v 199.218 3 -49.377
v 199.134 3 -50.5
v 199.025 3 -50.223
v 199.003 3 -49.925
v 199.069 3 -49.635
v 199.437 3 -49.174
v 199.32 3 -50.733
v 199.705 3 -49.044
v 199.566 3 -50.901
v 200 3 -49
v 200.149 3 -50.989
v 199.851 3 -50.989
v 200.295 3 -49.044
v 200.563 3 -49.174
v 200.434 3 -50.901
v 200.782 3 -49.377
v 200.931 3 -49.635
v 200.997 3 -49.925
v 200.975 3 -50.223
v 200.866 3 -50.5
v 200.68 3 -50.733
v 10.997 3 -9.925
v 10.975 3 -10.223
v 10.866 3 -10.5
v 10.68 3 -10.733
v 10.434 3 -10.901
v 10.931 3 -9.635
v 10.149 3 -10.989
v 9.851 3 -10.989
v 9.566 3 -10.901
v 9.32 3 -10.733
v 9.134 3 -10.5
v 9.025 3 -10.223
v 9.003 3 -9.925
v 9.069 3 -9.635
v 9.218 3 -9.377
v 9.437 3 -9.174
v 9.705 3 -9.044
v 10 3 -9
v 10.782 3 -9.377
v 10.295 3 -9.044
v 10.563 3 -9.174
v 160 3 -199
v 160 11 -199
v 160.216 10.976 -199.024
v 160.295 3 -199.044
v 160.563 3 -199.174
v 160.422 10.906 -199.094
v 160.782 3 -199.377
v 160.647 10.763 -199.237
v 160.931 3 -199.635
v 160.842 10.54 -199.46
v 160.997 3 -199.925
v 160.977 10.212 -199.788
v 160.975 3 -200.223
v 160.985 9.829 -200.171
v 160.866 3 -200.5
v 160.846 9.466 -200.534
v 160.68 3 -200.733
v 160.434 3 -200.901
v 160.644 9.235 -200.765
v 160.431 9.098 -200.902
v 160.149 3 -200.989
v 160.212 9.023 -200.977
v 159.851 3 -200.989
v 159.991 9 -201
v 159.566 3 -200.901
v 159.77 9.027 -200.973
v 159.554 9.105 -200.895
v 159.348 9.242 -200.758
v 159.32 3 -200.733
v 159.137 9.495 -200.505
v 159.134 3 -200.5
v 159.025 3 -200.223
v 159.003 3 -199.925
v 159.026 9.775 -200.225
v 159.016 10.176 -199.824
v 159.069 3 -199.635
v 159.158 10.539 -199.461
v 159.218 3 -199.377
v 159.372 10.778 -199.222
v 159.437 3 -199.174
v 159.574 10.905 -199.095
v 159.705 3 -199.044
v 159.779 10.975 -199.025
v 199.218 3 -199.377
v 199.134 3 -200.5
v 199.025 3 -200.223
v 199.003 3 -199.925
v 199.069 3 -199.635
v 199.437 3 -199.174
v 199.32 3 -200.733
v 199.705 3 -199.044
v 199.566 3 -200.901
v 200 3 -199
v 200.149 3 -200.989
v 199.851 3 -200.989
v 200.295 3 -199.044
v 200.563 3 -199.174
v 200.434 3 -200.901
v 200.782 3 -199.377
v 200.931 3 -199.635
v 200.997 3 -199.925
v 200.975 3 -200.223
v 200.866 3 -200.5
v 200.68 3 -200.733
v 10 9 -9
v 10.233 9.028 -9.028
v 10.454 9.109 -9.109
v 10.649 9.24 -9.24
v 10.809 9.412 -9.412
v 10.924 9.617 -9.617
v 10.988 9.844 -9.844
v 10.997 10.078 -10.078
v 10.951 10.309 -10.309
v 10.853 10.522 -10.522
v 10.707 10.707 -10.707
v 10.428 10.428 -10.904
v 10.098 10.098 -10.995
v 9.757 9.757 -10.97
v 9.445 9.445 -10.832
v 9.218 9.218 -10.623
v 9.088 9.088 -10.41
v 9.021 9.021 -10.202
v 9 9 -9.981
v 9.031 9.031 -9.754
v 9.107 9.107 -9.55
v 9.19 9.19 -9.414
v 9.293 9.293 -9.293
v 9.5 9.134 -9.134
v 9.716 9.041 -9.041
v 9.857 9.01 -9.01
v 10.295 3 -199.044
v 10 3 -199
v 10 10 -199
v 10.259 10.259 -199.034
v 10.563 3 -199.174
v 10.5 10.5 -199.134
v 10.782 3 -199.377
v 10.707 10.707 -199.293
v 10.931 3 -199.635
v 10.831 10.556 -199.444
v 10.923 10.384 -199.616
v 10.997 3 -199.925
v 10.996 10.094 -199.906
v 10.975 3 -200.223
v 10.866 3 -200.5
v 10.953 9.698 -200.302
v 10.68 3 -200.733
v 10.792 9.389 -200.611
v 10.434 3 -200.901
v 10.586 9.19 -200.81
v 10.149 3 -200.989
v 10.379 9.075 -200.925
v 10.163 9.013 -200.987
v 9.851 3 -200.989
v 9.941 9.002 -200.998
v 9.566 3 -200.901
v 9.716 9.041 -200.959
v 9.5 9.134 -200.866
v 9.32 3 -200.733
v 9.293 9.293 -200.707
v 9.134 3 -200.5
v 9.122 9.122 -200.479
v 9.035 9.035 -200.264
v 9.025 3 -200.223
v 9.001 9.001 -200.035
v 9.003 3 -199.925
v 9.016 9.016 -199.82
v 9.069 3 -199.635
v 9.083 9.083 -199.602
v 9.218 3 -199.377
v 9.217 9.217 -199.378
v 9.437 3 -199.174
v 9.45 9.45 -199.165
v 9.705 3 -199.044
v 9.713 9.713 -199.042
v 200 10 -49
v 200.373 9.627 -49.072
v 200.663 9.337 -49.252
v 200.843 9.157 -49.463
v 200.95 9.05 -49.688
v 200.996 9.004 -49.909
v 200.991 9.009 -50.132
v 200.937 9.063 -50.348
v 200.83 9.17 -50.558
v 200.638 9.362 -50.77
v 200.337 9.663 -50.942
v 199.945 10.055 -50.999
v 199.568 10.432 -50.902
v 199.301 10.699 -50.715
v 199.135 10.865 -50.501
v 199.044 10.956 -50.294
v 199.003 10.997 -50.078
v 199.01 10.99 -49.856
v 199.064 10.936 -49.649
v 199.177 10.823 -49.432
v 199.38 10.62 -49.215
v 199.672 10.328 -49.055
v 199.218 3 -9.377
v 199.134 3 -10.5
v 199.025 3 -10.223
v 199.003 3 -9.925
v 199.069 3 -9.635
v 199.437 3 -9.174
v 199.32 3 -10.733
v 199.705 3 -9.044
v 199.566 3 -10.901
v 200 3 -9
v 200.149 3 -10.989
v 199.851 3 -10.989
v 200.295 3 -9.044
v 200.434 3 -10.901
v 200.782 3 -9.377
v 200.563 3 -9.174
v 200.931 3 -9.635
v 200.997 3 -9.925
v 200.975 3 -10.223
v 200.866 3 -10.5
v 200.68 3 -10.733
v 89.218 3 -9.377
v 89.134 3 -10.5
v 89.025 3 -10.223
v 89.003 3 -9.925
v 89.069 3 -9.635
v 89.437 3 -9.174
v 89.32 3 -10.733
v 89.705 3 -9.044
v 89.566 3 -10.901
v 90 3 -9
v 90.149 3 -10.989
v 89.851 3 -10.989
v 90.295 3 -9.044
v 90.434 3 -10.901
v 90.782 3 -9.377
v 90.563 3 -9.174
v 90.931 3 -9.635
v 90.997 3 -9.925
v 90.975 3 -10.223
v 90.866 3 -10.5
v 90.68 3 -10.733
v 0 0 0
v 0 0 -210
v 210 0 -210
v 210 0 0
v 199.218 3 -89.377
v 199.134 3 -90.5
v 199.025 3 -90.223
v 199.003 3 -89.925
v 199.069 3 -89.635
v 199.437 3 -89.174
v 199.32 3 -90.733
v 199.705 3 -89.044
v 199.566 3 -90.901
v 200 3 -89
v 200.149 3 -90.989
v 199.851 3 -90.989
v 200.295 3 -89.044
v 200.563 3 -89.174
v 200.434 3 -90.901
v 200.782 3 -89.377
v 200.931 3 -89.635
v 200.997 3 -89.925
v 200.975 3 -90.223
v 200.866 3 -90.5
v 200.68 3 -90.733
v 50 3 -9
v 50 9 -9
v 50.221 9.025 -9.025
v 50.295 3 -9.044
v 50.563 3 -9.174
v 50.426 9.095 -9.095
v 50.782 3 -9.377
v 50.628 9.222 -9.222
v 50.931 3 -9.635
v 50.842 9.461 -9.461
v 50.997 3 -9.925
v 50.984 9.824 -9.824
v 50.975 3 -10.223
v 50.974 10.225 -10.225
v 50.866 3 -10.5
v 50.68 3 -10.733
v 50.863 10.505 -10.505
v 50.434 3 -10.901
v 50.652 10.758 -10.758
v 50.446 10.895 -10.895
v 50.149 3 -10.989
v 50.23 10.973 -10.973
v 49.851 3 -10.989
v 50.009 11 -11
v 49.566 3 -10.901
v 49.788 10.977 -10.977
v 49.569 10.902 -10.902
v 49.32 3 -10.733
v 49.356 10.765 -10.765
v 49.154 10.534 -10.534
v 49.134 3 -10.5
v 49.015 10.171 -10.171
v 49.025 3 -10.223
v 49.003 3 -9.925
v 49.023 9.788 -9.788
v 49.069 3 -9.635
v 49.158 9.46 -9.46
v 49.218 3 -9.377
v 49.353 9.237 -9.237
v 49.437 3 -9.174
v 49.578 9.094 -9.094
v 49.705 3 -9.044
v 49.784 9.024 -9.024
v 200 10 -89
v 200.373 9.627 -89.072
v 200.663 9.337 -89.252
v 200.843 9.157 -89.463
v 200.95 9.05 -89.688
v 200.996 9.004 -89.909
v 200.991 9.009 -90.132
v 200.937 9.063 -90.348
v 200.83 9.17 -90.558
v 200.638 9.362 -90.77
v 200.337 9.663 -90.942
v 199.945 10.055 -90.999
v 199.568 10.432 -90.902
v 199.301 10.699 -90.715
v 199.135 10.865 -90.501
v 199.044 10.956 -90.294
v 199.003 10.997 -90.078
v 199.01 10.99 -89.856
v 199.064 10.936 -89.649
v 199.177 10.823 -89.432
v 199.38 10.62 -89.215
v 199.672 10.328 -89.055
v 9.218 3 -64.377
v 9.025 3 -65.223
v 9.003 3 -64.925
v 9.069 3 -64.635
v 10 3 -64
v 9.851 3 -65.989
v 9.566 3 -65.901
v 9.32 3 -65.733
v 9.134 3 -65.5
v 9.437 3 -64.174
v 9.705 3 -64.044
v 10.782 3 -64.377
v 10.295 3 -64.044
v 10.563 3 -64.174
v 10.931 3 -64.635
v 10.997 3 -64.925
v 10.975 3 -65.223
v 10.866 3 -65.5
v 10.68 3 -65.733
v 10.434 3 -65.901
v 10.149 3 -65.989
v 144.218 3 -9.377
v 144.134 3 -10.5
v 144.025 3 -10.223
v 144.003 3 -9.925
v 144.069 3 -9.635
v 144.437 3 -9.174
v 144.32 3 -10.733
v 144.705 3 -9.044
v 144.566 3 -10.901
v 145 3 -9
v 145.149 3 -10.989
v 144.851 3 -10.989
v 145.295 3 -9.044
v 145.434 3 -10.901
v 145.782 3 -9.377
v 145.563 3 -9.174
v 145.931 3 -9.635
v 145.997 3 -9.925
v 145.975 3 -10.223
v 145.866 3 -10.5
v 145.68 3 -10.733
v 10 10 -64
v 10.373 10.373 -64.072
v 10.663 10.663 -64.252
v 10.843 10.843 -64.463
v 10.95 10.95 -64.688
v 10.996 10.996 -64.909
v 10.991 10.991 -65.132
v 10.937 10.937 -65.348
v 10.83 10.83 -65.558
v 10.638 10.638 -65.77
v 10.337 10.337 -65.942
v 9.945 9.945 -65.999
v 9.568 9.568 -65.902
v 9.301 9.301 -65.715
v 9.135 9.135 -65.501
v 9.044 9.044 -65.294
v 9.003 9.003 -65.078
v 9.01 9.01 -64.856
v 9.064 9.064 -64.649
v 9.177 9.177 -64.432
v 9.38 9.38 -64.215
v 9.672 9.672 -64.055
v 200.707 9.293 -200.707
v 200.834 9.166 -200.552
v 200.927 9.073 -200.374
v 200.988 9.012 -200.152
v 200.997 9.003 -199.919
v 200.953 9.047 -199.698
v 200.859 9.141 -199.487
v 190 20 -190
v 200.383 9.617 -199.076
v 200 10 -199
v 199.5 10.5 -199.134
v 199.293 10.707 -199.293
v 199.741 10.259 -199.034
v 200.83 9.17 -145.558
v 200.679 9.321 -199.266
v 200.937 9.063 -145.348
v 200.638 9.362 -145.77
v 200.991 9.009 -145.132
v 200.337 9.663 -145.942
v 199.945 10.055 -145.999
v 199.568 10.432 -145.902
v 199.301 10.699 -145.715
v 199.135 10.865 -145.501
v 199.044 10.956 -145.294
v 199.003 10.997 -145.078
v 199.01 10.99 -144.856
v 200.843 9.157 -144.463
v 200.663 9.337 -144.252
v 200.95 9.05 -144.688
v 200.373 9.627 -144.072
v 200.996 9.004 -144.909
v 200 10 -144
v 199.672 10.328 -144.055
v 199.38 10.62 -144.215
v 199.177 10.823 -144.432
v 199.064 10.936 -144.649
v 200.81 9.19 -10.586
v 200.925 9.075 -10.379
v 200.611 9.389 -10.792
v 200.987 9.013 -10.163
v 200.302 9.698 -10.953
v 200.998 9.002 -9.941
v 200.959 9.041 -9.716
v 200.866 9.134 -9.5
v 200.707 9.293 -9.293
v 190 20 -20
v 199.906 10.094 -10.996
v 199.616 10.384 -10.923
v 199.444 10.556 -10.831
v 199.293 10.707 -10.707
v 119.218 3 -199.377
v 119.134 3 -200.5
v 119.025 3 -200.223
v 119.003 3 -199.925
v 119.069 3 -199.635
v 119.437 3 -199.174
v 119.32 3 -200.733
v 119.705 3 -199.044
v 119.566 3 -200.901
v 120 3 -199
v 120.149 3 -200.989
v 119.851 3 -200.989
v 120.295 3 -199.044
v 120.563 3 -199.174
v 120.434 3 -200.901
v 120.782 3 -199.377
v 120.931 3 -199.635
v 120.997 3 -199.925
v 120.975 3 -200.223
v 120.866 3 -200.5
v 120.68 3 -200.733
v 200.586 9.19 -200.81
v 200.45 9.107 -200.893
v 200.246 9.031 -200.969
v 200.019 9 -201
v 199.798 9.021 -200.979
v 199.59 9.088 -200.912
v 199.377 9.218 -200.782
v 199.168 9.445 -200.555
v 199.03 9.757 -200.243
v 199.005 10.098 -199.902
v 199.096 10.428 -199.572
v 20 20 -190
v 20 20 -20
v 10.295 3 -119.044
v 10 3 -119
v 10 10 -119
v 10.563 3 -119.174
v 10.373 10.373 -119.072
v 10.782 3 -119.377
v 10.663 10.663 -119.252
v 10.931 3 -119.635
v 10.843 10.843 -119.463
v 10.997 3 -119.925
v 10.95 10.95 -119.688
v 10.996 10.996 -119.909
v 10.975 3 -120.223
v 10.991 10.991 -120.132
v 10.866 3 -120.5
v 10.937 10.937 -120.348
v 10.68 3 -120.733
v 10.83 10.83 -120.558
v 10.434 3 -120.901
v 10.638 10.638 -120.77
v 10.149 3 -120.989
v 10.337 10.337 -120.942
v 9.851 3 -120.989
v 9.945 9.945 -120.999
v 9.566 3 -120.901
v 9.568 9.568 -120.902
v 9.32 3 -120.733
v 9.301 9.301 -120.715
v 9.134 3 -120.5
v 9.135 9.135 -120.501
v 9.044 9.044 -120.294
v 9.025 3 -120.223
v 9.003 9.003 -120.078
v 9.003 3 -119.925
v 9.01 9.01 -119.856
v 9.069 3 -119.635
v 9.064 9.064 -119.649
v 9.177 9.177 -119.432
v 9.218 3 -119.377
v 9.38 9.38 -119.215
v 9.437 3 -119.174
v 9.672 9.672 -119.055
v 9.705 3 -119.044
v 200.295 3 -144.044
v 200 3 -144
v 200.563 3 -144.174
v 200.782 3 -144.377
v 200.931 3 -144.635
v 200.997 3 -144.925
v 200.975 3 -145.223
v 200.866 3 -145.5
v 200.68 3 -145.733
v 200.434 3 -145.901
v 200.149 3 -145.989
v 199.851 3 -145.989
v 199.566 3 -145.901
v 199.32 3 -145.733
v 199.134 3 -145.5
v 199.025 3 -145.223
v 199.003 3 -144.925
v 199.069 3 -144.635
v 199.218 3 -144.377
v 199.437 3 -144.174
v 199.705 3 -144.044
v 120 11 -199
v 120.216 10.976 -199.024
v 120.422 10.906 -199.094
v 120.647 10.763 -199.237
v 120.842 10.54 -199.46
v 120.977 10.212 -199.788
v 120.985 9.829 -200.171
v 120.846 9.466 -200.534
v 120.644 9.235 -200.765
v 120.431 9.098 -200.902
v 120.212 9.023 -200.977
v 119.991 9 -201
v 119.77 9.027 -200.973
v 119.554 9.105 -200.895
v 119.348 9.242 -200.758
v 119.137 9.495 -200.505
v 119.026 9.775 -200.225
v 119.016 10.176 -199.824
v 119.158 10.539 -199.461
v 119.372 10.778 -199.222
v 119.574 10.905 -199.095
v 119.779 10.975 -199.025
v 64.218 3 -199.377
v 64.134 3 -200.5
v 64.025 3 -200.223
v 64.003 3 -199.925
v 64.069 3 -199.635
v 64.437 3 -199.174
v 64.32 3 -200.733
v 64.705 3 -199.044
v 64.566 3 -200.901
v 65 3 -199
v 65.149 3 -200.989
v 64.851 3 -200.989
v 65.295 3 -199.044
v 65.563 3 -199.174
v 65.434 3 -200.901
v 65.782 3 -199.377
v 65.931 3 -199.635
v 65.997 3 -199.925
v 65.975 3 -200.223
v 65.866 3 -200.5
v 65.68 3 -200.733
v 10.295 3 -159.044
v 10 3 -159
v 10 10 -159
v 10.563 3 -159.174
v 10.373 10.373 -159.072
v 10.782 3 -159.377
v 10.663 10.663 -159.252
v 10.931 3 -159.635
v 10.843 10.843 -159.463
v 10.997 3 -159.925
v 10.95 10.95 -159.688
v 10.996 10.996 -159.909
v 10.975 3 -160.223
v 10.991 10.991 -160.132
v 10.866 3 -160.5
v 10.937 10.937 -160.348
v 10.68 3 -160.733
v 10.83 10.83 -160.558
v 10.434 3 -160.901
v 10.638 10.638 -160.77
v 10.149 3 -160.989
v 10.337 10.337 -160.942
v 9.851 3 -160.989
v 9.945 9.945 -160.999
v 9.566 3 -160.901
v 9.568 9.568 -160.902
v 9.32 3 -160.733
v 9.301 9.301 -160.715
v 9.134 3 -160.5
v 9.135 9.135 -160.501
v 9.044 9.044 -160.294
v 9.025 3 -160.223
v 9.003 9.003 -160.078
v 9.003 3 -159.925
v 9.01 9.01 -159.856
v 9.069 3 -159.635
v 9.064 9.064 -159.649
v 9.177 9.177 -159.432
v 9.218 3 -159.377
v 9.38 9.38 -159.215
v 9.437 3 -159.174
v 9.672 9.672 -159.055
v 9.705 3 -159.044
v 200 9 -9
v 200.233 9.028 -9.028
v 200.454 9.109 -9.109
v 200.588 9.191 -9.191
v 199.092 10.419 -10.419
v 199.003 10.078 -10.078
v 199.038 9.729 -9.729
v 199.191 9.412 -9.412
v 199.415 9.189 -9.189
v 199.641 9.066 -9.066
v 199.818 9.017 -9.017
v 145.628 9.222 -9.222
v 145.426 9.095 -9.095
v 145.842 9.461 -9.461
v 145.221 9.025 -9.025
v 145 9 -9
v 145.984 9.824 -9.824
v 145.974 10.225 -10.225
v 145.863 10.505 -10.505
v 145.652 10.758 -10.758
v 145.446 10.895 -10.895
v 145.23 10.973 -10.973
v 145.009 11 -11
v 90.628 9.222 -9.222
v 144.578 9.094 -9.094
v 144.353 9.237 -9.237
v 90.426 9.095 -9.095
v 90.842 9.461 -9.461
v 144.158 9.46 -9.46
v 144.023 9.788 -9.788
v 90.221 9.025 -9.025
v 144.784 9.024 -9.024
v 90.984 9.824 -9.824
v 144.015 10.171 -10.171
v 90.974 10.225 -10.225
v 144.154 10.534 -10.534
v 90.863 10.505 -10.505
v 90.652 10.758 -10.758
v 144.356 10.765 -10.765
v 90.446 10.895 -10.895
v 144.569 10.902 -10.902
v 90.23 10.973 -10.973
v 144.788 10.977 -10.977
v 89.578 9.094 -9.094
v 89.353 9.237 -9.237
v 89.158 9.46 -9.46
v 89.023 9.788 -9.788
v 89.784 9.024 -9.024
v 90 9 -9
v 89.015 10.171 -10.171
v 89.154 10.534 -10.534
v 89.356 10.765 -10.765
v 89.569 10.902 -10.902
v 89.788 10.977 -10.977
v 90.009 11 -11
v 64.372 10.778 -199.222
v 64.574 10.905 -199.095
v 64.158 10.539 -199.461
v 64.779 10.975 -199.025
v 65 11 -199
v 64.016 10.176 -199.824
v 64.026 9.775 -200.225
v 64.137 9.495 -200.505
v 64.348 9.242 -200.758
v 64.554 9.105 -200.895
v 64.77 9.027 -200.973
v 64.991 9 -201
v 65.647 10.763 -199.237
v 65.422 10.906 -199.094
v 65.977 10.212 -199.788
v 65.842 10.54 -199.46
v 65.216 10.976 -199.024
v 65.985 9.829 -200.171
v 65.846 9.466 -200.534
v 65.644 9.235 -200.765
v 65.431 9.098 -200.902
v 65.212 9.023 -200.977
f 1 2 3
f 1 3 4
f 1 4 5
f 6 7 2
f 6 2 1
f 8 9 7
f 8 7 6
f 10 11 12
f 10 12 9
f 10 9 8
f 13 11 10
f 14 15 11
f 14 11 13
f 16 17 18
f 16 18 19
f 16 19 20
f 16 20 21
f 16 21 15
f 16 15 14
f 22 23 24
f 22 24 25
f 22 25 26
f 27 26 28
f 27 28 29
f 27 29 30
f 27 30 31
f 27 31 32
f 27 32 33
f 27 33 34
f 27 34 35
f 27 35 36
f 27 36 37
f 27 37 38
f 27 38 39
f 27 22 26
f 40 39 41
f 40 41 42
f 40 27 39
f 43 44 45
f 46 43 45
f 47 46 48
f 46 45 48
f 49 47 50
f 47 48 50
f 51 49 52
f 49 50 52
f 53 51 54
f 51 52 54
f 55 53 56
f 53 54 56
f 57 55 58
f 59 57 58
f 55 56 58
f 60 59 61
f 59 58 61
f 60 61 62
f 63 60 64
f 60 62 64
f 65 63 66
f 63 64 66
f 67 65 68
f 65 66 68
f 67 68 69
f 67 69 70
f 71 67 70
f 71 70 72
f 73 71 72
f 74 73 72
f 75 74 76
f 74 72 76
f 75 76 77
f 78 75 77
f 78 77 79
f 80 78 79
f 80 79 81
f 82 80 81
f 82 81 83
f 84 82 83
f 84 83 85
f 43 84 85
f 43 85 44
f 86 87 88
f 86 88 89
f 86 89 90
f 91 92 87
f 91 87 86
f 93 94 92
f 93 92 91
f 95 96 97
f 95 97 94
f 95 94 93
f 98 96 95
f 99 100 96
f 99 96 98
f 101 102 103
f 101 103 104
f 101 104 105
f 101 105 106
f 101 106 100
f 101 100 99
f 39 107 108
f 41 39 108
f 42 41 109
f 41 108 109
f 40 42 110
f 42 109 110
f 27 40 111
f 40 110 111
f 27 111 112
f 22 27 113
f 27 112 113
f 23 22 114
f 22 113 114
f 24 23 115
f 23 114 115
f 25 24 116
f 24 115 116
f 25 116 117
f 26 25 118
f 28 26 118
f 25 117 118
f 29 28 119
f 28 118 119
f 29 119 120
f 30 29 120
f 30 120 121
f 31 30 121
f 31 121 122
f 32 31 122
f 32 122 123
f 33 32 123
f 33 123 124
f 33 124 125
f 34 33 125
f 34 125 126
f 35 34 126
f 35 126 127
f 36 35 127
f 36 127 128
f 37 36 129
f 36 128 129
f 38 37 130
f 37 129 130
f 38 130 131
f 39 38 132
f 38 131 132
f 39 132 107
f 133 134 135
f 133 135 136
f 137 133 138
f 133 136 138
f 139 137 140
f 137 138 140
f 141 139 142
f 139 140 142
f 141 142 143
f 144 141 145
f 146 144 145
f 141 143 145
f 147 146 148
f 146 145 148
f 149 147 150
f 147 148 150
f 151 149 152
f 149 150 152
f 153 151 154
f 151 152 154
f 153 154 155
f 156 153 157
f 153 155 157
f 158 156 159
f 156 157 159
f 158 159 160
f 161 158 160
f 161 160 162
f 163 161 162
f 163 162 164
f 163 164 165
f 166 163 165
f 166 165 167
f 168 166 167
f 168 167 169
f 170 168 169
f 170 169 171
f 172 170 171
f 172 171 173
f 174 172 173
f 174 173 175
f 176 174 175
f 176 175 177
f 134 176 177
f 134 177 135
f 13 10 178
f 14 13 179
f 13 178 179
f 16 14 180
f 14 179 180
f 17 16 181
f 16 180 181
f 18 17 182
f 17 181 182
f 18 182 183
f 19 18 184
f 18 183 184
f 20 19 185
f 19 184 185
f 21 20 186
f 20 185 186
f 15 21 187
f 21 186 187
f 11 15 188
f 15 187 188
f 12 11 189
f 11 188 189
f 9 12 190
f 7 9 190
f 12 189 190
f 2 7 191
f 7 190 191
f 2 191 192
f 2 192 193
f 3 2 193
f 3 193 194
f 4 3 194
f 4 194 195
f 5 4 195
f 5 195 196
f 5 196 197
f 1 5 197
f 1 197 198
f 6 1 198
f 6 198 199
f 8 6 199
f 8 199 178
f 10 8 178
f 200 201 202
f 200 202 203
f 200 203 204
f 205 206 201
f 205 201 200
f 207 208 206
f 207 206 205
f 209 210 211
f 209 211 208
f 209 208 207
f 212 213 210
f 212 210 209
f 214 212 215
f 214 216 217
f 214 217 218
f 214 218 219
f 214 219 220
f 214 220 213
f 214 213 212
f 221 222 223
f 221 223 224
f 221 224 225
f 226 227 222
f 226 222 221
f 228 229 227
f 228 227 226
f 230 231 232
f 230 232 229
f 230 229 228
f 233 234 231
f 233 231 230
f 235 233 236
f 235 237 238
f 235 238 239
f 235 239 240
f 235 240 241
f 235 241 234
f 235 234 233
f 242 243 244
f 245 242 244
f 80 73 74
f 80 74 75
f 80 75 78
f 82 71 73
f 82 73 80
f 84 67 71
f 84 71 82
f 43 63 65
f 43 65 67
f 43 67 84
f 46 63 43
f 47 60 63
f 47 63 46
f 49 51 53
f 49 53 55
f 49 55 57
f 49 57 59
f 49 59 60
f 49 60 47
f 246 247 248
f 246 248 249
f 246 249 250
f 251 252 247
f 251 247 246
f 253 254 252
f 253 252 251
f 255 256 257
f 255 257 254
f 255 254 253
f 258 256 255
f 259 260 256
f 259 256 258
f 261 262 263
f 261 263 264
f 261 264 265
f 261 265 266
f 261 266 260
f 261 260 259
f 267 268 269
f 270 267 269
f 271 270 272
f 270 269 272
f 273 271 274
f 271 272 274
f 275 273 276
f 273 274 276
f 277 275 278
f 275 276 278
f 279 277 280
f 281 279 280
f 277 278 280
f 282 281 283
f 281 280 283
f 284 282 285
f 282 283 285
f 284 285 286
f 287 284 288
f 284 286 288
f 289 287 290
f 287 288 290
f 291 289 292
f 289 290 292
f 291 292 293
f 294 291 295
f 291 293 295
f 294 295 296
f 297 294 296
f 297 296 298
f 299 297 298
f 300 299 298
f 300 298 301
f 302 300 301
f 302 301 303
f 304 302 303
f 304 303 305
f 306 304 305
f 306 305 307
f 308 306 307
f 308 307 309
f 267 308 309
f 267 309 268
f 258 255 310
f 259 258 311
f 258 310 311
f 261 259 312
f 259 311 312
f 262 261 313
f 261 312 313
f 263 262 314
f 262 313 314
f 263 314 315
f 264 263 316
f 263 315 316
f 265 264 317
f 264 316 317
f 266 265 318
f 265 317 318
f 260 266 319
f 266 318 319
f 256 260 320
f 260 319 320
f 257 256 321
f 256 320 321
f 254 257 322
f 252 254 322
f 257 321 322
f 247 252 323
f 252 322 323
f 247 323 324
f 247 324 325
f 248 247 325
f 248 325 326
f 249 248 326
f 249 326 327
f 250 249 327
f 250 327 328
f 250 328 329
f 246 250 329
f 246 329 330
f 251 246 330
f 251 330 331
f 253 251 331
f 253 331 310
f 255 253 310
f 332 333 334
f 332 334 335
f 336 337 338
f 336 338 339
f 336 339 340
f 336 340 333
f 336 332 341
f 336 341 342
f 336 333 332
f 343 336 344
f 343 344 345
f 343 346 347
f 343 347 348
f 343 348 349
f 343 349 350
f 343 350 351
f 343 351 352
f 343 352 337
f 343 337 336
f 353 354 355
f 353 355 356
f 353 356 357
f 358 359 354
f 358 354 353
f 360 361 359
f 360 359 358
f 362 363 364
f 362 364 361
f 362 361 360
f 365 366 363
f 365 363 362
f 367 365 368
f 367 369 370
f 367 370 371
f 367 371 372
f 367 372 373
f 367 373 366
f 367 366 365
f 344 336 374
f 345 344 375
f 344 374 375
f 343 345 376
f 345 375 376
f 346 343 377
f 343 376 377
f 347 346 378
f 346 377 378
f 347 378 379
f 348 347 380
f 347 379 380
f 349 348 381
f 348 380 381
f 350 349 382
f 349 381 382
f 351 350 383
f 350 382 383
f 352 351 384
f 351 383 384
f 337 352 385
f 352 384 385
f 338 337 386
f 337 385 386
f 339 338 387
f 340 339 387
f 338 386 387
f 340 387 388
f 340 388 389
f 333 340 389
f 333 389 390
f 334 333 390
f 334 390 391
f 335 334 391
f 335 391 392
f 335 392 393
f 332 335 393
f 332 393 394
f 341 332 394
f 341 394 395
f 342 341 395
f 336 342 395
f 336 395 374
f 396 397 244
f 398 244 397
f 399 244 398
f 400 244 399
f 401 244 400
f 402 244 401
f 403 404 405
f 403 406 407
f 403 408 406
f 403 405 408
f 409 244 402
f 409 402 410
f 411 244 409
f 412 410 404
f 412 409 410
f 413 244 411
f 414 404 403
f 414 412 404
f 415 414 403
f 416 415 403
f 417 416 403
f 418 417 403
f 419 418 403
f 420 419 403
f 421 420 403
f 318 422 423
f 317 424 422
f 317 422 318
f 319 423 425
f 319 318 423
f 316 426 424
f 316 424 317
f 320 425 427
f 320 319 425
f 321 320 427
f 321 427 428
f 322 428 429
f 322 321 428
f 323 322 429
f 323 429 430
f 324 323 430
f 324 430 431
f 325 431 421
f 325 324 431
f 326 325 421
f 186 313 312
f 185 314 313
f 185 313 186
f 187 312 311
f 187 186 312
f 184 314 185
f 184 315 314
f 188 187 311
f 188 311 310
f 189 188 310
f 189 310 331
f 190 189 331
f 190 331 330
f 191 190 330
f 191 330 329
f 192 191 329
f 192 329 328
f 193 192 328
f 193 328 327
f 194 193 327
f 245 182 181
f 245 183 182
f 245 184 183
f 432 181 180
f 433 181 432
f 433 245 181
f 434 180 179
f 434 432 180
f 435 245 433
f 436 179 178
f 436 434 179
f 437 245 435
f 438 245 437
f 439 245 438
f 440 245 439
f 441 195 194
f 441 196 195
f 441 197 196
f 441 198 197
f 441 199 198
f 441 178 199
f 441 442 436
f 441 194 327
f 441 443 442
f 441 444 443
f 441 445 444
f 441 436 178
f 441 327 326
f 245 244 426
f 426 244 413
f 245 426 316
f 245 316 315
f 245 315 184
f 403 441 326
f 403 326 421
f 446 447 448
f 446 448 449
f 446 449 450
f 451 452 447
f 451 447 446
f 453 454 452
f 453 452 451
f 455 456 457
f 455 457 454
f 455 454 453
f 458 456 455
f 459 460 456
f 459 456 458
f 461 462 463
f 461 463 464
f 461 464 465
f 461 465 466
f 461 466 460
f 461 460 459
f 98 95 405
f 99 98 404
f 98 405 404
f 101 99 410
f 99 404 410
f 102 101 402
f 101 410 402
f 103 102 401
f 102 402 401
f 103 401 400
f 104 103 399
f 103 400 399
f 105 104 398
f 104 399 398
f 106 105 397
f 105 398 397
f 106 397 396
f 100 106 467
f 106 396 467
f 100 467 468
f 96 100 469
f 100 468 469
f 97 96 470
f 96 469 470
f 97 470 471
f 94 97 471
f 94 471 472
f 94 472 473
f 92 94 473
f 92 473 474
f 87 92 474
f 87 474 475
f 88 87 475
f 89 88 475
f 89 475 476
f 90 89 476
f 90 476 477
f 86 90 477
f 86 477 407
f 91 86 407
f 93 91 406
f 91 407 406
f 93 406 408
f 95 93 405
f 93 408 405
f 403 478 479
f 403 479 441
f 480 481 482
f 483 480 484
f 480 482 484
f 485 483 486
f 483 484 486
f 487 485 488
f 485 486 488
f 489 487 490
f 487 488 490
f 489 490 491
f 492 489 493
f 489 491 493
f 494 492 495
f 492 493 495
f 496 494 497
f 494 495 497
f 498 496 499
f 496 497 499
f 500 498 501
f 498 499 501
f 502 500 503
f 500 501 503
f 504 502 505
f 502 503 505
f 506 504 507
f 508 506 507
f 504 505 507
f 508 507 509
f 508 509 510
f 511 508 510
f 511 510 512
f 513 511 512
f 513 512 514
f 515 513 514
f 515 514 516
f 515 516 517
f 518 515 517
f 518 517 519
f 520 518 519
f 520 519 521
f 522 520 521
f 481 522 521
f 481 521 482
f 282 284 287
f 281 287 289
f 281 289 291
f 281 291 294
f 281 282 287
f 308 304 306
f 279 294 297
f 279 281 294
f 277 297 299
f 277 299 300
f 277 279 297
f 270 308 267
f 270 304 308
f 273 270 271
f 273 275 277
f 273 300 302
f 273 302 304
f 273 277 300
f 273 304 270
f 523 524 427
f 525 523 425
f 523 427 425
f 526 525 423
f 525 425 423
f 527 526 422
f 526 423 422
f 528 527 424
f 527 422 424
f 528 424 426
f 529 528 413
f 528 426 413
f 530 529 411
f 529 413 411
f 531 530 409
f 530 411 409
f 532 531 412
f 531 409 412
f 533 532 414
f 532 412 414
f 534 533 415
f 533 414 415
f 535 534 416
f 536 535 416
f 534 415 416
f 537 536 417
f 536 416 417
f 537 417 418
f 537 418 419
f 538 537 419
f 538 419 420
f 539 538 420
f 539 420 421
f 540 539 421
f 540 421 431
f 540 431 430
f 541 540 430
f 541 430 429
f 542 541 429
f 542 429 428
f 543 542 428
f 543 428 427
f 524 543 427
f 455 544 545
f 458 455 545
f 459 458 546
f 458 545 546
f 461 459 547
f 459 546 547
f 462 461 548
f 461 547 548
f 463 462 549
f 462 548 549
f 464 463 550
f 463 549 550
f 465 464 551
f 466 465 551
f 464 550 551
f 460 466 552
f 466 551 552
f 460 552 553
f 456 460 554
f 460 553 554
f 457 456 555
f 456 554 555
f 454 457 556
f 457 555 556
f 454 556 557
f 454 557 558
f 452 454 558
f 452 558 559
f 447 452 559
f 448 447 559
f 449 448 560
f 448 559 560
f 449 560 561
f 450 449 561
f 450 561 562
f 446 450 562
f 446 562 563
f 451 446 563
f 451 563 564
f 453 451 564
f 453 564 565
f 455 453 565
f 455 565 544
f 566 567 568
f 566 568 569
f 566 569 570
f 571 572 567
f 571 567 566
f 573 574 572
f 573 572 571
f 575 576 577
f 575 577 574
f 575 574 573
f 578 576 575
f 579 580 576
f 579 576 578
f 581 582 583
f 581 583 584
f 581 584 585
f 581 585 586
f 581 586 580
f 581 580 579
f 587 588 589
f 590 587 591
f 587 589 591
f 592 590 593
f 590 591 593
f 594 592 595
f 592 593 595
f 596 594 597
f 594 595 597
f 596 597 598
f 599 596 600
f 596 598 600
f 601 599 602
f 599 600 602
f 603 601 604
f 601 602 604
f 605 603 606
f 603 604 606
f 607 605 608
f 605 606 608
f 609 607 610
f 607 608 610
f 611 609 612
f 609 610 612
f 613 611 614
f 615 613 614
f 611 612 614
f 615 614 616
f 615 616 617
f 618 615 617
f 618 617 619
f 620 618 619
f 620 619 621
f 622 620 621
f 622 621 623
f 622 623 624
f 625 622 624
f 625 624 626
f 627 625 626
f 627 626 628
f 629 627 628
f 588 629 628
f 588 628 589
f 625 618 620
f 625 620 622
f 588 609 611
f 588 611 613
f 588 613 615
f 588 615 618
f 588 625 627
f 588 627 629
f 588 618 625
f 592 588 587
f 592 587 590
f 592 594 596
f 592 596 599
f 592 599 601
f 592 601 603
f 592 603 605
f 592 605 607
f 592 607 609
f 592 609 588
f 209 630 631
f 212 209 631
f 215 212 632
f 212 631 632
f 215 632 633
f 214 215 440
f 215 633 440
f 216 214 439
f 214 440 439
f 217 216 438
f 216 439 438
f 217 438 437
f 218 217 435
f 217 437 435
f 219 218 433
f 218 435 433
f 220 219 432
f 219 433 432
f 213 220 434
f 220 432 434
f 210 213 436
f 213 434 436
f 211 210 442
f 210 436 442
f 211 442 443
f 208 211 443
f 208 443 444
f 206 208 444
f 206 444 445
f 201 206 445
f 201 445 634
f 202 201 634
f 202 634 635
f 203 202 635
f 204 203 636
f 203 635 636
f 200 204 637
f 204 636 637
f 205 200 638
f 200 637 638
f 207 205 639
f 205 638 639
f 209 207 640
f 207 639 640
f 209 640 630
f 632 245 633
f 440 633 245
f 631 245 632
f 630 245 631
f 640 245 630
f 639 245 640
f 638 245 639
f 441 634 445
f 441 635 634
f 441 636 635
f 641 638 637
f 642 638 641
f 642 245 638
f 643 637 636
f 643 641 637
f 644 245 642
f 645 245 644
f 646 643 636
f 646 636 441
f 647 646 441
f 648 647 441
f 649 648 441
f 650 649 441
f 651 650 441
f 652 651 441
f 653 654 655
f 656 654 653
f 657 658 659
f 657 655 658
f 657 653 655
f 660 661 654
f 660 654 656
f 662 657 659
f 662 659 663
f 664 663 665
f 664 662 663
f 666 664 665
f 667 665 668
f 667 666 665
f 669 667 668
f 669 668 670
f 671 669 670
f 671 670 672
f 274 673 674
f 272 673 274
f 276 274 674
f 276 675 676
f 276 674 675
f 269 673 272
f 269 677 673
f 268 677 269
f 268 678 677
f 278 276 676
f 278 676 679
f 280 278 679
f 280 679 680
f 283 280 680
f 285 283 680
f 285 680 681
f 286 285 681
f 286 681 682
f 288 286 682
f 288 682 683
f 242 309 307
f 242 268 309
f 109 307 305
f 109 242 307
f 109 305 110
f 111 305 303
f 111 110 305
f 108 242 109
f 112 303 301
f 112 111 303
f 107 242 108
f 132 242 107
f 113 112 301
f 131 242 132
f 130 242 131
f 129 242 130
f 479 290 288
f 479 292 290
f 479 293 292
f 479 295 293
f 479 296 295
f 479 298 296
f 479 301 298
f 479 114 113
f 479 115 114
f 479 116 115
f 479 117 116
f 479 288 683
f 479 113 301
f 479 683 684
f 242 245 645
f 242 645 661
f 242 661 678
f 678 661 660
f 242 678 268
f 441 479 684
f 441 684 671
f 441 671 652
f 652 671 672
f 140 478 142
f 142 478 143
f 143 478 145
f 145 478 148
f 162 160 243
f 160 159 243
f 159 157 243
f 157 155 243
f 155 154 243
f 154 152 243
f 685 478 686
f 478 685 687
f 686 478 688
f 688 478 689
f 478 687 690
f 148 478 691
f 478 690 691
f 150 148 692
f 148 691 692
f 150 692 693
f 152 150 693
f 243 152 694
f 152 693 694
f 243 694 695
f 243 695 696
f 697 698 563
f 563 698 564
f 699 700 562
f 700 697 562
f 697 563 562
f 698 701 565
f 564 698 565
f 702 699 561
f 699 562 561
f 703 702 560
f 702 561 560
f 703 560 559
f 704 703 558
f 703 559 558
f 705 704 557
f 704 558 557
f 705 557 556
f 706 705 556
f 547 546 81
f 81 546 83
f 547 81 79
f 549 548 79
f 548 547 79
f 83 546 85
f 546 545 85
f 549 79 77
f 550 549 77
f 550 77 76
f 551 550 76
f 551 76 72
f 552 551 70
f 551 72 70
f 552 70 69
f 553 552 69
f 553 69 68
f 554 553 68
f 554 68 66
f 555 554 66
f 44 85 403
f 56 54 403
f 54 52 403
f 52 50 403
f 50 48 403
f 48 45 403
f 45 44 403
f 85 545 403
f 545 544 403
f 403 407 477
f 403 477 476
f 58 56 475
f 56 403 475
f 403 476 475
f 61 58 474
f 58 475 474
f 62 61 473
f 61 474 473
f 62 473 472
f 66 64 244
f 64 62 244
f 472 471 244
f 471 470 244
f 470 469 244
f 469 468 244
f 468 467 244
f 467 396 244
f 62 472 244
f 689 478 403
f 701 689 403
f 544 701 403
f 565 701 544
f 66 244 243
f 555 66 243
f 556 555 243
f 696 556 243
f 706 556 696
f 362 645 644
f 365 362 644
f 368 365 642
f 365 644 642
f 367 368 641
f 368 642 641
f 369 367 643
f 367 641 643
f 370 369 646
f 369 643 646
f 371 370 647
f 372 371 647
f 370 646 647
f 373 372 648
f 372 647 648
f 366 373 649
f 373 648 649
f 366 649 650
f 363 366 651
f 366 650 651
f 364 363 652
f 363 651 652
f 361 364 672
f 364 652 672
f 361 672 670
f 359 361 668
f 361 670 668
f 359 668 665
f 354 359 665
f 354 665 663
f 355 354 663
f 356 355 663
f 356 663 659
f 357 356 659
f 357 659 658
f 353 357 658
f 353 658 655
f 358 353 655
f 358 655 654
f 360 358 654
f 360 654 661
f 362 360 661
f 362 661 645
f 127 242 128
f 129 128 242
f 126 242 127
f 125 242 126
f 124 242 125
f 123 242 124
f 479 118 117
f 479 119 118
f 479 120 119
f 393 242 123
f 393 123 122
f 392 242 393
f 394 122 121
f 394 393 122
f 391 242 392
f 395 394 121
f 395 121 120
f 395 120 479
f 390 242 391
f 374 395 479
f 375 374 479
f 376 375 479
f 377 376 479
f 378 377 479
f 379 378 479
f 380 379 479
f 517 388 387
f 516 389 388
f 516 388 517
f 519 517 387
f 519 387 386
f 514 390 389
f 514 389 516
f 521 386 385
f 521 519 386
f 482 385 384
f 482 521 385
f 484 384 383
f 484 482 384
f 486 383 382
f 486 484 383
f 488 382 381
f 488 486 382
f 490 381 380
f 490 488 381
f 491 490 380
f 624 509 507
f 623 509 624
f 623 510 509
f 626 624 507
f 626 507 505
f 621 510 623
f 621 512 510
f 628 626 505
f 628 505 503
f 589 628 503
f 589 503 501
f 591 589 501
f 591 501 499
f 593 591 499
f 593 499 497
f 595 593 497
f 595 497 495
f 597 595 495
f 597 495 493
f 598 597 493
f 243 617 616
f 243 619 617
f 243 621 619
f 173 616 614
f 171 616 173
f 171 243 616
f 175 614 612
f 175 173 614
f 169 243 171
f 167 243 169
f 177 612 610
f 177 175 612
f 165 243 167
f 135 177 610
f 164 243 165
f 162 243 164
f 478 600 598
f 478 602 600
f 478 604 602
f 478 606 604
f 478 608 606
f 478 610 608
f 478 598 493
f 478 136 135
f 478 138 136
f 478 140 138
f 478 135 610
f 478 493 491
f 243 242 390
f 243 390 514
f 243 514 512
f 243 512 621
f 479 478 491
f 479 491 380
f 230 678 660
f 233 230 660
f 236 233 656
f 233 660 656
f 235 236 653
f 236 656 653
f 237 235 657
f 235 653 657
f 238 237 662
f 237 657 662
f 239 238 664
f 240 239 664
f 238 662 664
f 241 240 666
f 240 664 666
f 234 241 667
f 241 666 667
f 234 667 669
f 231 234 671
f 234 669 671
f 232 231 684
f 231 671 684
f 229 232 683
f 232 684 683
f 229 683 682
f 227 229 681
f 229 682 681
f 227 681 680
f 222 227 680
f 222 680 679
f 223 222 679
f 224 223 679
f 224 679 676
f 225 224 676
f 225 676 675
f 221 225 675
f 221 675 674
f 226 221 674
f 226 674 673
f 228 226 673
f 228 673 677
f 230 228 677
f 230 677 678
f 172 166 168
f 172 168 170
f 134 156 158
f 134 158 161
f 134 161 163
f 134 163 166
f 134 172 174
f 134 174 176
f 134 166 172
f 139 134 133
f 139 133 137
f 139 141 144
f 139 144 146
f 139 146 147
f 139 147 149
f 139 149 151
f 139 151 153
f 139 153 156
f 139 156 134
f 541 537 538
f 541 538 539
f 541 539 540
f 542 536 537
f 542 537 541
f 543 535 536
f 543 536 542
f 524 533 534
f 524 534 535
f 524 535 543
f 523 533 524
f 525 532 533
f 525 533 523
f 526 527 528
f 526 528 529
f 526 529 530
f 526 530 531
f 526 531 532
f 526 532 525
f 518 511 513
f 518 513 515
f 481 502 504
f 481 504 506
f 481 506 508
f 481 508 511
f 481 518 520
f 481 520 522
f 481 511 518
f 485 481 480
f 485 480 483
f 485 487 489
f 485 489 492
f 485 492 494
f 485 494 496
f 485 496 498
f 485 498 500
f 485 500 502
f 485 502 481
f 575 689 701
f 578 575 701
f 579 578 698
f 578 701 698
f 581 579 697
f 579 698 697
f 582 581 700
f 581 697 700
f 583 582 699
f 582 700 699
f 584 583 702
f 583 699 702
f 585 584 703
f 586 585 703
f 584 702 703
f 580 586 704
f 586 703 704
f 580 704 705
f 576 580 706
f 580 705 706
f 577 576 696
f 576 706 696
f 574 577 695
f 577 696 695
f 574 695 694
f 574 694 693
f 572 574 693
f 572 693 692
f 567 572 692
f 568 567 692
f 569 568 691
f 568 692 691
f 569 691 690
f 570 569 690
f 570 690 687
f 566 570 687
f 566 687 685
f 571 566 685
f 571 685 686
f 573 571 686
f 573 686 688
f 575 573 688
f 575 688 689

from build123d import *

# Parameters (mm, degrees)
CENTERSKETCH1_W            = 210
CENTERSKETCH1_H            = 210
CENTERBOSS_EXTRUDE1_DEPTH  = 20
TABHOLESSKETCH1_R          = 1
TABHOLESCUT_EXTRUDE1_DEPTH = 17
CHAMFER1_SIZE              = 20


with BuildPart() as part:
    # CenterSketch1 → CenterBoss-Extrude1 (new body)
    with BuildSketch(Plane(origin=(0, 0, 0), x_dir=(1, 0, 0), z_dir=(0, 1, 0))):
        with Locations((105, 105)):
            Rectangle(CENTERSKETCH1_W, CENTERSKETCH1_H)
    extrude(amount=CENTERBOSS_EXTRUDE1_DEPTH)

    # TabHolesSketch1 → TabHolesCut-Extrude1 (cut)
    with BuildSketch(Plane(origin=(0, 20, 0), x_dir=(1, 0, 0), z_dir=(0, 1, 0))):
        with Locations(Location((10, 10, 0), (0, 0, 270))):
            Circle(TABHOLESSKETCH1_R)
        with Locations(Location((200, 10, 0), (0, 0, 270))):
            Circle(TABHOLESSKETCH1_R)
        with Locations(Location((200, 200, 0), (0, 0, 270))):
            Circle(TABHOLESSKETCH1_R)
        with Locations(Location((10, 200, 0), (0, 0, 270))):
            Circle(TABHOLESSKETCH1_R)
        with Locations(Location((65, 200, 0), (0, 0, 270))):
            Circle(TABHOLESSKETCH1_R)
        with Locations(Location((120, 200, 0), (0, 0, 270))):
            Circle(TABHOLESSKETCH1_R)
        with Locations(Location((160, 200, 0), (0, 0, 270))):
            Circle(TABHOLESSKETCH1_R)
        with Locations(Location((10, 160, 0), (0, 0, 270))):
            Circle(TABHOLESSKETCH1_R)
        with Locations(Location((10, 65, 0), (0, 0, 270))):
            Circle(TABHOLESSKETCH1_R)
        with Locations(Location((10, 120, 0), (0, 0, 270))):
            Circle(TABHOLESSKETCH1_R)
        with Locations(Location((50, 10, 0), (0, 0, 270))):
            Circle(TABHOLESSKETCH1_R)
        with Locations(Location((90, 10, 0), (0, 0, 270))):
            Circle(TABHOLESSKETCH1_R)
        with Locations(Location((145, 10, 0), (0, 0, 270))):
            Circle(TABHOLESSKETCH1_R)
        with Locations(Location((200, 145, 0), (0, 0, 270))):
            Circle(TABHOLESSKETCH1_R)
        with Locations(Location((200, 90, 0), (0, 0, 270))):
            Circle(TABHOLESSKETCH1_R)
        with Locations(Location((200, 50, 0), (0, 0, 270))):
            Circle(TABHOLESSKETCH1_R)
    extrude(amount=-TABHOLESCUT_EXTRUDE1_DEPTH, mode=Mode.SUBTRACT)

    # Chamfer1
    # the kernel refuses this chamfer: 20 mm, written as the material it takes off along each edge
    with BuildSketch(Plane(origin=(-51.433659759, 20, 0), x_dir=(0, -0.9996219169112968, 0.027495876610586372), z_dir=(1, 0, 0)), Plane(origin=(210, 20, 51.433659759), x_dir=(0.027495876610586317, -0.9996219169112968, 0), z_dir=(0, 0, -1)), Plane(origin=(0, 20, -261.433659759), x_dir=(-0.027495876610586372, -0.9996219169112968, 0), z_dir=(0, 0, 1))) as chamfer1_piece_1:
        Polygon((CHAMFER1_SIZE * 0.999621916911, CHAMFER1_SIZE * 0.0274958766106), (-CHAMFER1_SIZE * 0.0274958766106, CHAMFER1_SIZE * 0.999621916911), (0, 0), align=None)
    extrude(amount=312.867319519, mode=Mode.SUBTRACT)
    with BuildSketch(Plane(origin=(261.433659759, 20, -210), x_dir=(0, 0.027495876610586317, 0.9996219169112968), z_dir=(-1, 0, 0))) as chamfer1_piece_2:
        Polygon((CHAMFER1_SIZE * 0.999621916911, -CHAMFER1_SIZE * 0.0274958766106), (-CHAMFER1_SIZE * 0.0274958766106, -CHAMFER1_SIZE * 0.999621916911), (0, 0), align=None)
    extrude(amount=312.867319519, mode=Mode.SUBTRACT)


solid = part.part
